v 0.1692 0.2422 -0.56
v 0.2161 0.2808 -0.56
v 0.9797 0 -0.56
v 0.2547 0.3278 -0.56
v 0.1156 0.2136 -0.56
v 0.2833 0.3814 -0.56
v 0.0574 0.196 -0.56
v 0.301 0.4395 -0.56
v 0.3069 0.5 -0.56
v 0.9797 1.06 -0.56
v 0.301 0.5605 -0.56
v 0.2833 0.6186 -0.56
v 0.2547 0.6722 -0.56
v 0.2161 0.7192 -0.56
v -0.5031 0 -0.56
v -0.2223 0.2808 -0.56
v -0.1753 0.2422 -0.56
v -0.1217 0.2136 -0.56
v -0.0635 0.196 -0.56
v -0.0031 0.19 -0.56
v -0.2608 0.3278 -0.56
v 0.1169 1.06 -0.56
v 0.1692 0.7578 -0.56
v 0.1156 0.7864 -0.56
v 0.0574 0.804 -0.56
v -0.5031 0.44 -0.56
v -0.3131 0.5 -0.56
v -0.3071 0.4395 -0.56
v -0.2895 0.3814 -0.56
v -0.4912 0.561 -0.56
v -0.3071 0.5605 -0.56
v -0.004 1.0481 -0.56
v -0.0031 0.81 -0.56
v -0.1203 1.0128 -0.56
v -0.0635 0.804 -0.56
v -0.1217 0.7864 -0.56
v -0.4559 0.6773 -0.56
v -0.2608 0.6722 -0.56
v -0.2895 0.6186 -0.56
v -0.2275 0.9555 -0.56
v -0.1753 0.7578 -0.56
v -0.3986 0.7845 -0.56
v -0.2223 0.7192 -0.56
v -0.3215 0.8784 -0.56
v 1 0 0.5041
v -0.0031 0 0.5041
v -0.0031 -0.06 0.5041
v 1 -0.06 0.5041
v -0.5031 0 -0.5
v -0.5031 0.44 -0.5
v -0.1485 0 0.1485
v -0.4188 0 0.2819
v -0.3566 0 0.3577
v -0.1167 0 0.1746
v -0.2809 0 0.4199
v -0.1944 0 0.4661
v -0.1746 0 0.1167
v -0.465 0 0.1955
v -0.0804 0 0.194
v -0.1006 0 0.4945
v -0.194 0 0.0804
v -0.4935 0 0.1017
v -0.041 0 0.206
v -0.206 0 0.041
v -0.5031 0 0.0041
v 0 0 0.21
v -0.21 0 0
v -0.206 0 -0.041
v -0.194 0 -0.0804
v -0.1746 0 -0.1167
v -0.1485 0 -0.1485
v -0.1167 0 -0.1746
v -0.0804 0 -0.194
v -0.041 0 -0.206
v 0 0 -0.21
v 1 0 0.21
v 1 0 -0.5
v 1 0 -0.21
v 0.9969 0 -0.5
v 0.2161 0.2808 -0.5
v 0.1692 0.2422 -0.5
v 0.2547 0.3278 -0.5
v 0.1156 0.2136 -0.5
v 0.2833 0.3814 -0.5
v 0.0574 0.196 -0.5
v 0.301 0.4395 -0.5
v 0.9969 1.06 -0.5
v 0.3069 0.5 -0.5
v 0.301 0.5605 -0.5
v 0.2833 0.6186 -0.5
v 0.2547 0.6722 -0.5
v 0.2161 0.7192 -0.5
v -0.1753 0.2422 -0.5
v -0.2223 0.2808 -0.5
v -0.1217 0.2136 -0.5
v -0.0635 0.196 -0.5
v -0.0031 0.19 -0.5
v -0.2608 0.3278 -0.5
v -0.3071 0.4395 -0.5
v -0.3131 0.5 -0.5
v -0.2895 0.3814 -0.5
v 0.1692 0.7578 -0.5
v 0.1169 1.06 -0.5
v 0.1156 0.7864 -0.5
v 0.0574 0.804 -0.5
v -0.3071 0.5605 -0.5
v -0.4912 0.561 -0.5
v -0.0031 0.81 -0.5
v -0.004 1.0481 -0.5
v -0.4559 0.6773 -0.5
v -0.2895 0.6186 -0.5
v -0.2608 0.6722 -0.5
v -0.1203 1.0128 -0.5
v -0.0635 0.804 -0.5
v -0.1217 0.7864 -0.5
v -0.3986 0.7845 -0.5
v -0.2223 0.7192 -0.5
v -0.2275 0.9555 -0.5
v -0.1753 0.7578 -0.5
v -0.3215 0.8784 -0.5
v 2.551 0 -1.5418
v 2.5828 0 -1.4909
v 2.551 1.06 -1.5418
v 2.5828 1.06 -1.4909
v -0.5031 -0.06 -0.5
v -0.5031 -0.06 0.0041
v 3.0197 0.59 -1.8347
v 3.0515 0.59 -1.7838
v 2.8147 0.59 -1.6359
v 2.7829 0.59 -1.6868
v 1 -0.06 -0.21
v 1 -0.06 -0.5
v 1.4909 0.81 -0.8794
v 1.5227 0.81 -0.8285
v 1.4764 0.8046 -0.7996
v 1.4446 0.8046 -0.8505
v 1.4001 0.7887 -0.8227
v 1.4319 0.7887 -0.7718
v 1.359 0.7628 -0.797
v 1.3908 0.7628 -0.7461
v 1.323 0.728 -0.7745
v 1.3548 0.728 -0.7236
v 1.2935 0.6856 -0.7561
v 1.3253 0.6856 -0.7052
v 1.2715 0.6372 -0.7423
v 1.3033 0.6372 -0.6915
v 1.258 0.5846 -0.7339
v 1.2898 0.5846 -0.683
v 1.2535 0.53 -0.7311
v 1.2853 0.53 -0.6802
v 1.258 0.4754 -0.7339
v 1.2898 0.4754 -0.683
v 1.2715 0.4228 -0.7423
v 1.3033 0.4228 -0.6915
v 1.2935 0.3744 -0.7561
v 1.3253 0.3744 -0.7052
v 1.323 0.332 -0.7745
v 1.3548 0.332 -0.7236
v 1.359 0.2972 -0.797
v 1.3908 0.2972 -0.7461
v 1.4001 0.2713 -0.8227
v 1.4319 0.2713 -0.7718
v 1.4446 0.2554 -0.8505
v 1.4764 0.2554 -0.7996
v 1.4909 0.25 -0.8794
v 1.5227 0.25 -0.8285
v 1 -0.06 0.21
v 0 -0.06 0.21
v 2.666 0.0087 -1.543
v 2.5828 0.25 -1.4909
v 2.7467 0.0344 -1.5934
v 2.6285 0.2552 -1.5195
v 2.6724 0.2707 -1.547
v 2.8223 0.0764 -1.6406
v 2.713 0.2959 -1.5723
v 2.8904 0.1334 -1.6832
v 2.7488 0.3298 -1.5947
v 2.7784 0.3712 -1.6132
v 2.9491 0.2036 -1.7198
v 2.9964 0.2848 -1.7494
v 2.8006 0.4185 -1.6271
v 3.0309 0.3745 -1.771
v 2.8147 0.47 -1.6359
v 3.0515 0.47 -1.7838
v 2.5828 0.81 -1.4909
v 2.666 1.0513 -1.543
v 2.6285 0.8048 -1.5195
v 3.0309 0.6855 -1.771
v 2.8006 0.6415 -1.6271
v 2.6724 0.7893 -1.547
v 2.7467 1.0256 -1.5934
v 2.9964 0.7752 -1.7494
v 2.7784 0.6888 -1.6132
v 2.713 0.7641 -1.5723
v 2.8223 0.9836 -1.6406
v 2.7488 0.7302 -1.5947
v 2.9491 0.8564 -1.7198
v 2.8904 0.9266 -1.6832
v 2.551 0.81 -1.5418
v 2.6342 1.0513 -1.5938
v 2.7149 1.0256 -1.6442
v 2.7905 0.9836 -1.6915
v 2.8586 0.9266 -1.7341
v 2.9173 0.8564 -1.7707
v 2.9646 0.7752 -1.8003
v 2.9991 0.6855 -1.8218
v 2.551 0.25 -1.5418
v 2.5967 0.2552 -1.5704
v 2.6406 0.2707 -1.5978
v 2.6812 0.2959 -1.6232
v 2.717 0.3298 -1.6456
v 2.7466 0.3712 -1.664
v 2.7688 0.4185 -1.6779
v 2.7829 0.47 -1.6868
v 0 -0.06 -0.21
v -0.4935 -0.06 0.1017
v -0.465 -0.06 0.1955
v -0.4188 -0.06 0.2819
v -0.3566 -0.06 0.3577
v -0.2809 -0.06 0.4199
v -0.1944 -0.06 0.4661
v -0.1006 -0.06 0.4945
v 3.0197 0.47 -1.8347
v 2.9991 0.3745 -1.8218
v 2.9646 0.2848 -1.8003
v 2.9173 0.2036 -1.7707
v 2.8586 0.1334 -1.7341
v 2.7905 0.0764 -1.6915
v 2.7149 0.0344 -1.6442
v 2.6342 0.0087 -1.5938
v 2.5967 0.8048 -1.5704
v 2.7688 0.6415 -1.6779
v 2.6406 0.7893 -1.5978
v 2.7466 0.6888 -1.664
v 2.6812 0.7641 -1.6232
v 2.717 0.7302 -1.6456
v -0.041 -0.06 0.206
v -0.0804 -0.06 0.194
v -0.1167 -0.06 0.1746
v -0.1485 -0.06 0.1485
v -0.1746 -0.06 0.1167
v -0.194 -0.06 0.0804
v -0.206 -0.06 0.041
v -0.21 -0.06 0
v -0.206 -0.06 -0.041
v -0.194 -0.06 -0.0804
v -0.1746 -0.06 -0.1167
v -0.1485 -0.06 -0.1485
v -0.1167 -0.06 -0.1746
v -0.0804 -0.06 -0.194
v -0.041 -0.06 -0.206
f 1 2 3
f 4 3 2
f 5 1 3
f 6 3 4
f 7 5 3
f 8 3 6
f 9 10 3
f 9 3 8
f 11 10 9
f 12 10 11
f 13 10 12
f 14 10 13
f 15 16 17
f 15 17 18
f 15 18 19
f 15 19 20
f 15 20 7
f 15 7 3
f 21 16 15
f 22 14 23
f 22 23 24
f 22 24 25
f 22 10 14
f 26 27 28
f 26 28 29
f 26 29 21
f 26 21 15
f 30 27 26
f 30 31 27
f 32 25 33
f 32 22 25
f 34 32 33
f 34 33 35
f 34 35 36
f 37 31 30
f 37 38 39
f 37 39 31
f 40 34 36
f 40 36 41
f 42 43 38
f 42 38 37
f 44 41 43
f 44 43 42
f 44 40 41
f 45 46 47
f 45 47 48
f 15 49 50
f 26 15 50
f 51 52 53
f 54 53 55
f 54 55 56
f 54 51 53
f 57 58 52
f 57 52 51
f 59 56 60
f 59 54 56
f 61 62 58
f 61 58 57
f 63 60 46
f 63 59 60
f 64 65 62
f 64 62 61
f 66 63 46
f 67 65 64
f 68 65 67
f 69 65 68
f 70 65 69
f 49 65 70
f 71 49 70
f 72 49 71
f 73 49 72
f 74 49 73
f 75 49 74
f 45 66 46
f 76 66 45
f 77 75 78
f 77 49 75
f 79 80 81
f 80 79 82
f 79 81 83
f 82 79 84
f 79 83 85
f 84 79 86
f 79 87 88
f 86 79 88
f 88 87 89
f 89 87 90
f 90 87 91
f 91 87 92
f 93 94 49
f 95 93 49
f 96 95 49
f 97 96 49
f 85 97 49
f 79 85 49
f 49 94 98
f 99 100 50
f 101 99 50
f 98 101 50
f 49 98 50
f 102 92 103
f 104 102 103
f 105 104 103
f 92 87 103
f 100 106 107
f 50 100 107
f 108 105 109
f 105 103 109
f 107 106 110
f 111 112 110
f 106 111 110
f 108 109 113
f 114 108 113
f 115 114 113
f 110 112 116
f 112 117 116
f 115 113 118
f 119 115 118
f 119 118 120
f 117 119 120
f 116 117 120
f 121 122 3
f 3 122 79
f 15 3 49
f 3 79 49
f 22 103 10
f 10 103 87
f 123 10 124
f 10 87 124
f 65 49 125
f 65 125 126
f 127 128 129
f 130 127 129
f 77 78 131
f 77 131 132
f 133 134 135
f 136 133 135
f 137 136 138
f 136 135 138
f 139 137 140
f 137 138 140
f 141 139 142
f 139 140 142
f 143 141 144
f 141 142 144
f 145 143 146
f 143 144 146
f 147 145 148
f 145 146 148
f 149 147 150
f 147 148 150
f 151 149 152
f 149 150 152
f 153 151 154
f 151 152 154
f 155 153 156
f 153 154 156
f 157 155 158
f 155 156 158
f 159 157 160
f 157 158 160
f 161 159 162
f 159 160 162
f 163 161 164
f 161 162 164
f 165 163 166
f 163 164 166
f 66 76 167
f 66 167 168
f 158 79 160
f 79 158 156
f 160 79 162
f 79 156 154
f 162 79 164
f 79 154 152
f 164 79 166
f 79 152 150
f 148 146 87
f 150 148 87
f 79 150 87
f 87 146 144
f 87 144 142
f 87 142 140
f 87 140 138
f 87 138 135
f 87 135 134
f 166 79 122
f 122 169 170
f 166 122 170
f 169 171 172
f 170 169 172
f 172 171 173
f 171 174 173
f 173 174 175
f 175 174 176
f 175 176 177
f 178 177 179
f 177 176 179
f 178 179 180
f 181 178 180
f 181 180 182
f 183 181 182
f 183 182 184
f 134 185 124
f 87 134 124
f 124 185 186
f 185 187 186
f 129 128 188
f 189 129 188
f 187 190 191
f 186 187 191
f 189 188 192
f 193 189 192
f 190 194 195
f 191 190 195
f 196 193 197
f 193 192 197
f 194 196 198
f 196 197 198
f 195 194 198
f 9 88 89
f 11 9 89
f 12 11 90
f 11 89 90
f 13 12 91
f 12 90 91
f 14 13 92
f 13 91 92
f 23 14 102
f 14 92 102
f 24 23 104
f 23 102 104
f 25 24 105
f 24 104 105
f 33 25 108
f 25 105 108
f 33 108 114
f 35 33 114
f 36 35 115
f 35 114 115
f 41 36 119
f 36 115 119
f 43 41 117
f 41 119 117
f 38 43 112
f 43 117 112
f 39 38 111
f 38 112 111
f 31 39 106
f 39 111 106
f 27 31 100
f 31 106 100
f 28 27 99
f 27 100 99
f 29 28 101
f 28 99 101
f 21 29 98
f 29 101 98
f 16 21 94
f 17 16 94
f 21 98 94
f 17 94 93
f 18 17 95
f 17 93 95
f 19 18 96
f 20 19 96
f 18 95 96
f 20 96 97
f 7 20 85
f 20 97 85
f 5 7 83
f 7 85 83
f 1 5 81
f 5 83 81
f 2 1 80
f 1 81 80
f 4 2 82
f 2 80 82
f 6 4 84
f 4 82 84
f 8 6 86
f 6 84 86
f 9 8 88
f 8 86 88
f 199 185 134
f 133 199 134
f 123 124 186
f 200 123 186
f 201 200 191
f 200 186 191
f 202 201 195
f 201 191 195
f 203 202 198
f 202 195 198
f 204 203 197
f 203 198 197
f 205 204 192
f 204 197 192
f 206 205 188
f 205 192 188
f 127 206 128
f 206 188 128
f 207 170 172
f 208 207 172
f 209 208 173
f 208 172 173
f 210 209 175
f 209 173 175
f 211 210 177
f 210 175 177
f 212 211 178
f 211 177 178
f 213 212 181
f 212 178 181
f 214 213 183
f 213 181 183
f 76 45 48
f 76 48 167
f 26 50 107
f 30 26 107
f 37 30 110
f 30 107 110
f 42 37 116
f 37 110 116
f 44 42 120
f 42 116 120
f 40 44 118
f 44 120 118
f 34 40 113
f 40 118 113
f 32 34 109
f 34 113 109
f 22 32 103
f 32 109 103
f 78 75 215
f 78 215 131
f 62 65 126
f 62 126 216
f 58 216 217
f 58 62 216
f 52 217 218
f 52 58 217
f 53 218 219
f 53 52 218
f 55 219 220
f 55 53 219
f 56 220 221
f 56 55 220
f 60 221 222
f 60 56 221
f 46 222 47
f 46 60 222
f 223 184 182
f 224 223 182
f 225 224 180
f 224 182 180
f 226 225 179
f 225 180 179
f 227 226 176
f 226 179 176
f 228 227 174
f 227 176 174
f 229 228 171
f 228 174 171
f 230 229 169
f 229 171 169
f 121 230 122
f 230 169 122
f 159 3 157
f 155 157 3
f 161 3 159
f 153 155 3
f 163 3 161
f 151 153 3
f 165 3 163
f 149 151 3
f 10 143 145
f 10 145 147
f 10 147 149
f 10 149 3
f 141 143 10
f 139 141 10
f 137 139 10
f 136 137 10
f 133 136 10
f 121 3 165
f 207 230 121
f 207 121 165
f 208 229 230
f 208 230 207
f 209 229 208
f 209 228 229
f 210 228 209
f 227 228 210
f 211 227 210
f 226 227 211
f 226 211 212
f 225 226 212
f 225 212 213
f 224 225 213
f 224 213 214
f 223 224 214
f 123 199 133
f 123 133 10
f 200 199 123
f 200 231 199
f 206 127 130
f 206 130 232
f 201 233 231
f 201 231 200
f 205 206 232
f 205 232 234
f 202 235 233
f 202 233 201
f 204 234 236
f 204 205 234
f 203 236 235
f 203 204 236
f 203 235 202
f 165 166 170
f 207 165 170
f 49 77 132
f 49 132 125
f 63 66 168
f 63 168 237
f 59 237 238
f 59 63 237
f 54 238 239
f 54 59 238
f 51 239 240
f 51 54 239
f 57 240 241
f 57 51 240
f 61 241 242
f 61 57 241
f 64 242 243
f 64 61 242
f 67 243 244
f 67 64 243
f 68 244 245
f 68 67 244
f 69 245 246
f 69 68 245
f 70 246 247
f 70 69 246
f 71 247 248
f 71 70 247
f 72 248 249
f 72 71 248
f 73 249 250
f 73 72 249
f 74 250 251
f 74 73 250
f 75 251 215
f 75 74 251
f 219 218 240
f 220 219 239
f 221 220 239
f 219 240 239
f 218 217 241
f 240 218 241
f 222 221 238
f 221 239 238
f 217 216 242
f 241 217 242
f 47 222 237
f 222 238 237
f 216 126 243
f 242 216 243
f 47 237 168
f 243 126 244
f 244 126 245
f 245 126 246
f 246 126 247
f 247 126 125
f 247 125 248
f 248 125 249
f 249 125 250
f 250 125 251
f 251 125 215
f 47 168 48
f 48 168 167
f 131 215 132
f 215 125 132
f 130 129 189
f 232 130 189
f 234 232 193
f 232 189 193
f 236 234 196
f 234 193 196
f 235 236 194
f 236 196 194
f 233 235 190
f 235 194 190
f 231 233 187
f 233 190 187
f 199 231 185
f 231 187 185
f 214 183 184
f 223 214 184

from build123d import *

# Parameters (mm, degrees)
BOSS_EXTRUDE3_DEPTH = 0.06
SKETCH2_R           = 0.31
BOSS_EXTRUDE4_DEPTH = 0.06
BOSS_EXTRUDE5_DEPTH = 0.06


with BuildPart() as part:
    # Sketch1 → Boss-Extrude3 (new body)
    with BuildSketch(Plane(origin=(0, 0, 0), x_dir=(1, 0, 0), z_dir=(0, 1, 0))):
        with BuildLine():
            Line((-0.003067481, -0.504131751), (1, -0.504131751))
            Line((1, -0.504131751), (1, -0.21))
            Line((1, -0.21), (0, -0.21))
            ThreePointArc((0, -0.21), (-0.209999993, 0), (0, 0.209999993))
            Line((0, 0.209999993), (1, 0.209999993))
            Line((1, 0.209999993), (1, 0.5))
            Line((1, 0.5), (-0.503067481, 0.5))
            Line((-0.503067481, 0.5), (-0.503067481, -0.004131751))
            ThreePointArc((-0.503067481, -0.004131751), (-0.356620872, -0.357685141), (-0.003067481, -0.504131751))
        make_face()
    extrude(amount=-BOSS_EXTRUDE3_DEPTH)


with BuildPart() as body_2:
    # Sketch2 → Boss-Extrude4 (new body)
    with BuildSketch(Plane.XY.offset(-0.5)):
        with BuildLine():
            Line((-0.503067481, 0), (-0.503067481, 0.44))
            ThreePointArc((-0.503067481, 0.44), (-0.321473686, 0.878406204), (0.116932519, 1.06))
            Line((0.116932519, 1.06), (0.996932519, 1.06))
            Line((0.996932519, 1.06), (0.996932519, 0))
            Line((0.996932519, 0), (-0.503067481, 0))
        make_face()
        with Locations((-0.003067481, 0.5)):
            Circle(SKETCH2_R, mode=Mode.SUBTRACT)
    extrude(amount=-BOSS_EXTRUDE4_DEPTH)

    # Sketch3 → Boss-Extrude5 (add)
    with BuildSketch(Plane(origin=(0.055254522, 0, 0.08842572), x_dir=(0, -1, 0), z_dir=(0.529919264233203, 0, 0.8480480961564272))):
        with BuildLine():
            Line((-1.06, 1.110406357), (-1.06, 2.980406357))
            ThreePointArc((-1.06, 2.980406357), (-0.92661458, 3.3431735), (-0.59, 3.533126901))
            Line((-0.59, 3.533126901), (-0.59, 3.253902243))
            ThreePointArc((-0.59, 3.253902243), (-0.748174242, 3.155905644), (-0.81, 2.980406357))
            Line((-0.81, 2.980406357), (-0.81, 1.730406357))
            ThreePointArc((-0.81, 1.730406357), (-0.53, 1.450406357), (-0.25, 1.730406357))
            Line((-0.25, 1.730406357), (-0.25, 2.980406357))
            ThreePointArc((-0.25, 2.980406357), (-0.311825758, 3.155905644), (-0.47, 3.253902243))
            Line((-0.47, 3.253902243), (-0.47, 3.533126901))
            ThreePointArc((-0.47, 3.533126901), (-0.13338542, 3.3431735), (0, 2.980406357))
            Line((0, 2.980406357), (0, 1.110406357))
            Line((0, 1.110406357), (-1.06, 1.110406357))
        make_face()
    extrude(amount=-BOSS_EXTRUDE5_DEPTH)


solid = Compound([part.part, body_2.part])
